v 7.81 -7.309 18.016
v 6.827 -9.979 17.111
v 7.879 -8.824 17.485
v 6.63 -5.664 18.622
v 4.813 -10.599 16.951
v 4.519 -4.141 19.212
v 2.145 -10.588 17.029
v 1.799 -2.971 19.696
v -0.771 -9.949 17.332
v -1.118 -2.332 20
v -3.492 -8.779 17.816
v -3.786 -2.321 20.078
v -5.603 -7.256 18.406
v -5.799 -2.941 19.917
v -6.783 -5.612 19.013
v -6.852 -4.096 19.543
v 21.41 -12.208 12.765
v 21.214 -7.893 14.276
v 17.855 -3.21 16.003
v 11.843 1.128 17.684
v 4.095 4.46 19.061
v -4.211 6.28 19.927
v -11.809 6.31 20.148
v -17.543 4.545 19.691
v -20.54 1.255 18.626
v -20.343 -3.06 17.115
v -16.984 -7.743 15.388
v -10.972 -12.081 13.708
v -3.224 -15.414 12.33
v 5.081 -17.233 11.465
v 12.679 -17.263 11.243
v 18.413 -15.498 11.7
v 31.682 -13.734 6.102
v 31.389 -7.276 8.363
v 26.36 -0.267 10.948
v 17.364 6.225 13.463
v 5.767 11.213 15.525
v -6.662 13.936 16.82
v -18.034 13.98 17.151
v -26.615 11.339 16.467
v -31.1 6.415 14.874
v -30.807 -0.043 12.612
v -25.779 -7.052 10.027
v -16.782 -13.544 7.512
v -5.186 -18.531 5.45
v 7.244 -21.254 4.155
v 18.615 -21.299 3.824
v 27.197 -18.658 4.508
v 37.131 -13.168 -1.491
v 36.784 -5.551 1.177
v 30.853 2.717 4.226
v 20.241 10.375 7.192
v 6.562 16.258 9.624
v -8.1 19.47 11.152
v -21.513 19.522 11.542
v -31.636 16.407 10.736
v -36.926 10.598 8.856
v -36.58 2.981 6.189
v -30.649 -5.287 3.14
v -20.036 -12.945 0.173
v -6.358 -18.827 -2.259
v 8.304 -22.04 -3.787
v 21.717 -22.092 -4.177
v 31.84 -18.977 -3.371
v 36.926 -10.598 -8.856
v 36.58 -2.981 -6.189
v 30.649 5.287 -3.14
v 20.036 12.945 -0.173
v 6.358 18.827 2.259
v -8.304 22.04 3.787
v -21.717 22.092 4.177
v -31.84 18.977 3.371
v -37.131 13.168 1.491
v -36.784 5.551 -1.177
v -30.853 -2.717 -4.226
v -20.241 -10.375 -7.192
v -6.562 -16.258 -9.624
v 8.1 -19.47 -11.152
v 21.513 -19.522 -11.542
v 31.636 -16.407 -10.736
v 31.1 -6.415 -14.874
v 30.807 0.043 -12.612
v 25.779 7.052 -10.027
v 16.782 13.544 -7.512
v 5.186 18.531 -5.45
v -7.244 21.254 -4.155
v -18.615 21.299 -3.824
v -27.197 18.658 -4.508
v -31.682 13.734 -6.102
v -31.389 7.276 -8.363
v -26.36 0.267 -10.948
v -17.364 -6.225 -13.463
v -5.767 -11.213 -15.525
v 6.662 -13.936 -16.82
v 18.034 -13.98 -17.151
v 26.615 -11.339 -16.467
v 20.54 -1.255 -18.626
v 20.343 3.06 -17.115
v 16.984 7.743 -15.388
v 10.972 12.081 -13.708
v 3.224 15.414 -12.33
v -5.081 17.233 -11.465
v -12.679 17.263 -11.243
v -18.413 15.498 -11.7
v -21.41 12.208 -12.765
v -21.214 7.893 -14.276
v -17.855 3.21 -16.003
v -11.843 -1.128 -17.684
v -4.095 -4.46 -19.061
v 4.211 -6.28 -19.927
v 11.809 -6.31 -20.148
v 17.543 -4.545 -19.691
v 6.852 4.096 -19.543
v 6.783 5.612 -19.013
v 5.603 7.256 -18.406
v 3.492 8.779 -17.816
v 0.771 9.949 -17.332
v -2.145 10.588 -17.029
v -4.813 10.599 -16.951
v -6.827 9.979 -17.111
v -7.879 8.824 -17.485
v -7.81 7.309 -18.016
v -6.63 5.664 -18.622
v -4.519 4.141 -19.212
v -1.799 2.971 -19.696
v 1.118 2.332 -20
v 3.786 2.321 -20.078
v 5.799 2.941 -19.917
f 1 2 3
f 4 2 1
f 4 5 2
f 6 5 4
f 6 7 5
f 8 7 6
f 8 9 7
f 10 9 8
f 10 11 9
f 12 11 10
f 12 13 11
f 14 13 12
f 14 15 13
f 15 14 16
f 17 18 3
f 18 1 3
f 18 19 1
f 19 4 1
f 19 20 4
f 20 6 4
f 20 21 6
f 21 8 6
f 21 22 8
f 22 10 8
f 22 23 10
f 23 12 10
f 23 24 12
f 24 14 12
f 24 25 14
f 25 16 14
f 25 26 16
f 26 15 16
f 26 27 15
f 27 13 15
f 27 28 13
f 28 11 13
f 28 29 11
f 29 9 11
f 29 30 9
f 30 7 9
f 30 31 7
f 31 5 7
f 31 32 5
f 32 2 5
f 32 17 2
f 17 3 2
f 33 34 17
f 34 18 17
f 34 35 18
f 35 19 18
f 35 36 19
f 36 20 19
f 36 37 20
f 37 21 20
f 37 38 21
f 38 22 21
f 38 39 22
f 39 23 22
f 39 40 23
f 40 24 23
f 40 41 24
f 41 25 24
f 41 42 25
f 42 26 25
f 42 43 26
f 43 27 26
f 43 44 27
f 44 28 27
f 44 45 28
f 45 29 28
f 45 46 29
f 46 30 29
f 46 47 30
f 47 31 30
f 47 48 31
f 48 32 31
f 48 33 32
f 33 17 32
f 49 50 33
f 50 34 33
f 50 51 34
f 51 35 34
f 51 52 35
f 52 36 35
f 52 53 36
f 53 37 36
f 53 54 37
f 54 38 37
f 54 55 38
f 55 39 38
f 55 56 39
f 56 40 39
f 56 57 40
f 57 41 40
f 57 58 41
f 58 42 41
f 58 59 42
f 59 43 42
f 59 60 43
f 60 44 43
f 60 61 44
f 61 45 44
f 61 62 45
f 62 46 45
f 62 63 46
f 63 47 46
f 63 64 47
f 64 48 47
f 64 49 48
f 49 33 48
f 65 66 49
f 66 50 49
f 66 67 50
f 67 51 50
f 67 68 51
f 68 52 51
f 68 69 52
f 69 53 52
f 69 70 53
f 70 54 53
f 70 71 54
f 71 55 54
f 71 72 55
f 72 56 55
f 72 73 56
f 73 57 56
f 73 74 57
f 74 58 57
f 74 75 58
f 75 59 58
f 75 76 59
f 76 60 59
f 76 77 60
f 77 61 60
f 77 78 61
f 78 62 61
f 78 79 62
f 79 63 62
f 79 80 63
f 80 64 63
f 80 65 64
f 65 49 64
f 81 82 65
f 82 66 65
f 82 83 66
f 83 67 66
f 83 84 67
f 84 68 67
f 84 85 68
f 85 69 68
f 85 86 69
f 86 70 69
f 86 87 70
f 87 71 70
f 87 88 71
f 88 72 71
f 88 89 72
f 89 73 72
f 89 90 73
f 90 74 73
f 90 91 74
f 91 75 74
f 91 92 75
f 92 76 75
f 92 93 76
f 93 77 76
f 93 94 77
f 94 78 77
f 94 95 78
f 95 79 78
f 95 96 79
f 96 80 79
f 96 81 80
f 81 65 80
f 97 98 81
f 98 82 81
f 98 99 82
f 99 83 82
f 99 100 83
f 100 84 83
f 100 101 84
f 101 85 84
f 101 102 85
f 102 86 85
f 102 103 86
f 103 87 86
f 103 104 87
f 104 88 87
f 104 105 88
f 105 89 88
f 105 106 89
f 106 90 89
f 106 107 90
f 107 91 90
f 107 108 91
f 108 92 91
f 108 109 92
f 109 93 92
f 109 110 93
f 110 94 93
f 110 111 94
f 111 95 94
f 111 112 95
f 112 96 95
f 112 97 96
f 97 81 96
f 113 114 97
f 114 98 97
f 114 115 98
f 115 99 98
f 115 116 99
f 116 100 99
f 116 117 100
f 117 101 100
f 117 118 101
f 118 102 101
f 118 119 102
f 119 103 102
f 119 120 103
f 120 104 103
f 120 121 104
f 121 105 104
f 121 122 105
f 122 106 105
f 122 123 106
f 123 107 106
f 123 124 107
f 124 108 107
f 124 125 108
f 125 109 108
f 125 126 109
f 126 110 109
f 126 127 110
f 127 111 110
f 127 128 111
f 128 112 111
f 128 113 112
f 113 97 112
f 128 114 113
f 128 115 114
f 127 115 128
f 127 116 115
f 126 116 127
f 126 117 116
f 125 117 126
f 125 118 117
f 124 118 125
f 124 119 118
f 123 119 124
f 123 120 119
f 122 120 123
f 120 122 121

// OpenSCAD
$fn=16;
rotate(a = 27, v = [1, 0.25, -1]) 
scale(v = [2, 1, 1])
	sphere(r = 20);
